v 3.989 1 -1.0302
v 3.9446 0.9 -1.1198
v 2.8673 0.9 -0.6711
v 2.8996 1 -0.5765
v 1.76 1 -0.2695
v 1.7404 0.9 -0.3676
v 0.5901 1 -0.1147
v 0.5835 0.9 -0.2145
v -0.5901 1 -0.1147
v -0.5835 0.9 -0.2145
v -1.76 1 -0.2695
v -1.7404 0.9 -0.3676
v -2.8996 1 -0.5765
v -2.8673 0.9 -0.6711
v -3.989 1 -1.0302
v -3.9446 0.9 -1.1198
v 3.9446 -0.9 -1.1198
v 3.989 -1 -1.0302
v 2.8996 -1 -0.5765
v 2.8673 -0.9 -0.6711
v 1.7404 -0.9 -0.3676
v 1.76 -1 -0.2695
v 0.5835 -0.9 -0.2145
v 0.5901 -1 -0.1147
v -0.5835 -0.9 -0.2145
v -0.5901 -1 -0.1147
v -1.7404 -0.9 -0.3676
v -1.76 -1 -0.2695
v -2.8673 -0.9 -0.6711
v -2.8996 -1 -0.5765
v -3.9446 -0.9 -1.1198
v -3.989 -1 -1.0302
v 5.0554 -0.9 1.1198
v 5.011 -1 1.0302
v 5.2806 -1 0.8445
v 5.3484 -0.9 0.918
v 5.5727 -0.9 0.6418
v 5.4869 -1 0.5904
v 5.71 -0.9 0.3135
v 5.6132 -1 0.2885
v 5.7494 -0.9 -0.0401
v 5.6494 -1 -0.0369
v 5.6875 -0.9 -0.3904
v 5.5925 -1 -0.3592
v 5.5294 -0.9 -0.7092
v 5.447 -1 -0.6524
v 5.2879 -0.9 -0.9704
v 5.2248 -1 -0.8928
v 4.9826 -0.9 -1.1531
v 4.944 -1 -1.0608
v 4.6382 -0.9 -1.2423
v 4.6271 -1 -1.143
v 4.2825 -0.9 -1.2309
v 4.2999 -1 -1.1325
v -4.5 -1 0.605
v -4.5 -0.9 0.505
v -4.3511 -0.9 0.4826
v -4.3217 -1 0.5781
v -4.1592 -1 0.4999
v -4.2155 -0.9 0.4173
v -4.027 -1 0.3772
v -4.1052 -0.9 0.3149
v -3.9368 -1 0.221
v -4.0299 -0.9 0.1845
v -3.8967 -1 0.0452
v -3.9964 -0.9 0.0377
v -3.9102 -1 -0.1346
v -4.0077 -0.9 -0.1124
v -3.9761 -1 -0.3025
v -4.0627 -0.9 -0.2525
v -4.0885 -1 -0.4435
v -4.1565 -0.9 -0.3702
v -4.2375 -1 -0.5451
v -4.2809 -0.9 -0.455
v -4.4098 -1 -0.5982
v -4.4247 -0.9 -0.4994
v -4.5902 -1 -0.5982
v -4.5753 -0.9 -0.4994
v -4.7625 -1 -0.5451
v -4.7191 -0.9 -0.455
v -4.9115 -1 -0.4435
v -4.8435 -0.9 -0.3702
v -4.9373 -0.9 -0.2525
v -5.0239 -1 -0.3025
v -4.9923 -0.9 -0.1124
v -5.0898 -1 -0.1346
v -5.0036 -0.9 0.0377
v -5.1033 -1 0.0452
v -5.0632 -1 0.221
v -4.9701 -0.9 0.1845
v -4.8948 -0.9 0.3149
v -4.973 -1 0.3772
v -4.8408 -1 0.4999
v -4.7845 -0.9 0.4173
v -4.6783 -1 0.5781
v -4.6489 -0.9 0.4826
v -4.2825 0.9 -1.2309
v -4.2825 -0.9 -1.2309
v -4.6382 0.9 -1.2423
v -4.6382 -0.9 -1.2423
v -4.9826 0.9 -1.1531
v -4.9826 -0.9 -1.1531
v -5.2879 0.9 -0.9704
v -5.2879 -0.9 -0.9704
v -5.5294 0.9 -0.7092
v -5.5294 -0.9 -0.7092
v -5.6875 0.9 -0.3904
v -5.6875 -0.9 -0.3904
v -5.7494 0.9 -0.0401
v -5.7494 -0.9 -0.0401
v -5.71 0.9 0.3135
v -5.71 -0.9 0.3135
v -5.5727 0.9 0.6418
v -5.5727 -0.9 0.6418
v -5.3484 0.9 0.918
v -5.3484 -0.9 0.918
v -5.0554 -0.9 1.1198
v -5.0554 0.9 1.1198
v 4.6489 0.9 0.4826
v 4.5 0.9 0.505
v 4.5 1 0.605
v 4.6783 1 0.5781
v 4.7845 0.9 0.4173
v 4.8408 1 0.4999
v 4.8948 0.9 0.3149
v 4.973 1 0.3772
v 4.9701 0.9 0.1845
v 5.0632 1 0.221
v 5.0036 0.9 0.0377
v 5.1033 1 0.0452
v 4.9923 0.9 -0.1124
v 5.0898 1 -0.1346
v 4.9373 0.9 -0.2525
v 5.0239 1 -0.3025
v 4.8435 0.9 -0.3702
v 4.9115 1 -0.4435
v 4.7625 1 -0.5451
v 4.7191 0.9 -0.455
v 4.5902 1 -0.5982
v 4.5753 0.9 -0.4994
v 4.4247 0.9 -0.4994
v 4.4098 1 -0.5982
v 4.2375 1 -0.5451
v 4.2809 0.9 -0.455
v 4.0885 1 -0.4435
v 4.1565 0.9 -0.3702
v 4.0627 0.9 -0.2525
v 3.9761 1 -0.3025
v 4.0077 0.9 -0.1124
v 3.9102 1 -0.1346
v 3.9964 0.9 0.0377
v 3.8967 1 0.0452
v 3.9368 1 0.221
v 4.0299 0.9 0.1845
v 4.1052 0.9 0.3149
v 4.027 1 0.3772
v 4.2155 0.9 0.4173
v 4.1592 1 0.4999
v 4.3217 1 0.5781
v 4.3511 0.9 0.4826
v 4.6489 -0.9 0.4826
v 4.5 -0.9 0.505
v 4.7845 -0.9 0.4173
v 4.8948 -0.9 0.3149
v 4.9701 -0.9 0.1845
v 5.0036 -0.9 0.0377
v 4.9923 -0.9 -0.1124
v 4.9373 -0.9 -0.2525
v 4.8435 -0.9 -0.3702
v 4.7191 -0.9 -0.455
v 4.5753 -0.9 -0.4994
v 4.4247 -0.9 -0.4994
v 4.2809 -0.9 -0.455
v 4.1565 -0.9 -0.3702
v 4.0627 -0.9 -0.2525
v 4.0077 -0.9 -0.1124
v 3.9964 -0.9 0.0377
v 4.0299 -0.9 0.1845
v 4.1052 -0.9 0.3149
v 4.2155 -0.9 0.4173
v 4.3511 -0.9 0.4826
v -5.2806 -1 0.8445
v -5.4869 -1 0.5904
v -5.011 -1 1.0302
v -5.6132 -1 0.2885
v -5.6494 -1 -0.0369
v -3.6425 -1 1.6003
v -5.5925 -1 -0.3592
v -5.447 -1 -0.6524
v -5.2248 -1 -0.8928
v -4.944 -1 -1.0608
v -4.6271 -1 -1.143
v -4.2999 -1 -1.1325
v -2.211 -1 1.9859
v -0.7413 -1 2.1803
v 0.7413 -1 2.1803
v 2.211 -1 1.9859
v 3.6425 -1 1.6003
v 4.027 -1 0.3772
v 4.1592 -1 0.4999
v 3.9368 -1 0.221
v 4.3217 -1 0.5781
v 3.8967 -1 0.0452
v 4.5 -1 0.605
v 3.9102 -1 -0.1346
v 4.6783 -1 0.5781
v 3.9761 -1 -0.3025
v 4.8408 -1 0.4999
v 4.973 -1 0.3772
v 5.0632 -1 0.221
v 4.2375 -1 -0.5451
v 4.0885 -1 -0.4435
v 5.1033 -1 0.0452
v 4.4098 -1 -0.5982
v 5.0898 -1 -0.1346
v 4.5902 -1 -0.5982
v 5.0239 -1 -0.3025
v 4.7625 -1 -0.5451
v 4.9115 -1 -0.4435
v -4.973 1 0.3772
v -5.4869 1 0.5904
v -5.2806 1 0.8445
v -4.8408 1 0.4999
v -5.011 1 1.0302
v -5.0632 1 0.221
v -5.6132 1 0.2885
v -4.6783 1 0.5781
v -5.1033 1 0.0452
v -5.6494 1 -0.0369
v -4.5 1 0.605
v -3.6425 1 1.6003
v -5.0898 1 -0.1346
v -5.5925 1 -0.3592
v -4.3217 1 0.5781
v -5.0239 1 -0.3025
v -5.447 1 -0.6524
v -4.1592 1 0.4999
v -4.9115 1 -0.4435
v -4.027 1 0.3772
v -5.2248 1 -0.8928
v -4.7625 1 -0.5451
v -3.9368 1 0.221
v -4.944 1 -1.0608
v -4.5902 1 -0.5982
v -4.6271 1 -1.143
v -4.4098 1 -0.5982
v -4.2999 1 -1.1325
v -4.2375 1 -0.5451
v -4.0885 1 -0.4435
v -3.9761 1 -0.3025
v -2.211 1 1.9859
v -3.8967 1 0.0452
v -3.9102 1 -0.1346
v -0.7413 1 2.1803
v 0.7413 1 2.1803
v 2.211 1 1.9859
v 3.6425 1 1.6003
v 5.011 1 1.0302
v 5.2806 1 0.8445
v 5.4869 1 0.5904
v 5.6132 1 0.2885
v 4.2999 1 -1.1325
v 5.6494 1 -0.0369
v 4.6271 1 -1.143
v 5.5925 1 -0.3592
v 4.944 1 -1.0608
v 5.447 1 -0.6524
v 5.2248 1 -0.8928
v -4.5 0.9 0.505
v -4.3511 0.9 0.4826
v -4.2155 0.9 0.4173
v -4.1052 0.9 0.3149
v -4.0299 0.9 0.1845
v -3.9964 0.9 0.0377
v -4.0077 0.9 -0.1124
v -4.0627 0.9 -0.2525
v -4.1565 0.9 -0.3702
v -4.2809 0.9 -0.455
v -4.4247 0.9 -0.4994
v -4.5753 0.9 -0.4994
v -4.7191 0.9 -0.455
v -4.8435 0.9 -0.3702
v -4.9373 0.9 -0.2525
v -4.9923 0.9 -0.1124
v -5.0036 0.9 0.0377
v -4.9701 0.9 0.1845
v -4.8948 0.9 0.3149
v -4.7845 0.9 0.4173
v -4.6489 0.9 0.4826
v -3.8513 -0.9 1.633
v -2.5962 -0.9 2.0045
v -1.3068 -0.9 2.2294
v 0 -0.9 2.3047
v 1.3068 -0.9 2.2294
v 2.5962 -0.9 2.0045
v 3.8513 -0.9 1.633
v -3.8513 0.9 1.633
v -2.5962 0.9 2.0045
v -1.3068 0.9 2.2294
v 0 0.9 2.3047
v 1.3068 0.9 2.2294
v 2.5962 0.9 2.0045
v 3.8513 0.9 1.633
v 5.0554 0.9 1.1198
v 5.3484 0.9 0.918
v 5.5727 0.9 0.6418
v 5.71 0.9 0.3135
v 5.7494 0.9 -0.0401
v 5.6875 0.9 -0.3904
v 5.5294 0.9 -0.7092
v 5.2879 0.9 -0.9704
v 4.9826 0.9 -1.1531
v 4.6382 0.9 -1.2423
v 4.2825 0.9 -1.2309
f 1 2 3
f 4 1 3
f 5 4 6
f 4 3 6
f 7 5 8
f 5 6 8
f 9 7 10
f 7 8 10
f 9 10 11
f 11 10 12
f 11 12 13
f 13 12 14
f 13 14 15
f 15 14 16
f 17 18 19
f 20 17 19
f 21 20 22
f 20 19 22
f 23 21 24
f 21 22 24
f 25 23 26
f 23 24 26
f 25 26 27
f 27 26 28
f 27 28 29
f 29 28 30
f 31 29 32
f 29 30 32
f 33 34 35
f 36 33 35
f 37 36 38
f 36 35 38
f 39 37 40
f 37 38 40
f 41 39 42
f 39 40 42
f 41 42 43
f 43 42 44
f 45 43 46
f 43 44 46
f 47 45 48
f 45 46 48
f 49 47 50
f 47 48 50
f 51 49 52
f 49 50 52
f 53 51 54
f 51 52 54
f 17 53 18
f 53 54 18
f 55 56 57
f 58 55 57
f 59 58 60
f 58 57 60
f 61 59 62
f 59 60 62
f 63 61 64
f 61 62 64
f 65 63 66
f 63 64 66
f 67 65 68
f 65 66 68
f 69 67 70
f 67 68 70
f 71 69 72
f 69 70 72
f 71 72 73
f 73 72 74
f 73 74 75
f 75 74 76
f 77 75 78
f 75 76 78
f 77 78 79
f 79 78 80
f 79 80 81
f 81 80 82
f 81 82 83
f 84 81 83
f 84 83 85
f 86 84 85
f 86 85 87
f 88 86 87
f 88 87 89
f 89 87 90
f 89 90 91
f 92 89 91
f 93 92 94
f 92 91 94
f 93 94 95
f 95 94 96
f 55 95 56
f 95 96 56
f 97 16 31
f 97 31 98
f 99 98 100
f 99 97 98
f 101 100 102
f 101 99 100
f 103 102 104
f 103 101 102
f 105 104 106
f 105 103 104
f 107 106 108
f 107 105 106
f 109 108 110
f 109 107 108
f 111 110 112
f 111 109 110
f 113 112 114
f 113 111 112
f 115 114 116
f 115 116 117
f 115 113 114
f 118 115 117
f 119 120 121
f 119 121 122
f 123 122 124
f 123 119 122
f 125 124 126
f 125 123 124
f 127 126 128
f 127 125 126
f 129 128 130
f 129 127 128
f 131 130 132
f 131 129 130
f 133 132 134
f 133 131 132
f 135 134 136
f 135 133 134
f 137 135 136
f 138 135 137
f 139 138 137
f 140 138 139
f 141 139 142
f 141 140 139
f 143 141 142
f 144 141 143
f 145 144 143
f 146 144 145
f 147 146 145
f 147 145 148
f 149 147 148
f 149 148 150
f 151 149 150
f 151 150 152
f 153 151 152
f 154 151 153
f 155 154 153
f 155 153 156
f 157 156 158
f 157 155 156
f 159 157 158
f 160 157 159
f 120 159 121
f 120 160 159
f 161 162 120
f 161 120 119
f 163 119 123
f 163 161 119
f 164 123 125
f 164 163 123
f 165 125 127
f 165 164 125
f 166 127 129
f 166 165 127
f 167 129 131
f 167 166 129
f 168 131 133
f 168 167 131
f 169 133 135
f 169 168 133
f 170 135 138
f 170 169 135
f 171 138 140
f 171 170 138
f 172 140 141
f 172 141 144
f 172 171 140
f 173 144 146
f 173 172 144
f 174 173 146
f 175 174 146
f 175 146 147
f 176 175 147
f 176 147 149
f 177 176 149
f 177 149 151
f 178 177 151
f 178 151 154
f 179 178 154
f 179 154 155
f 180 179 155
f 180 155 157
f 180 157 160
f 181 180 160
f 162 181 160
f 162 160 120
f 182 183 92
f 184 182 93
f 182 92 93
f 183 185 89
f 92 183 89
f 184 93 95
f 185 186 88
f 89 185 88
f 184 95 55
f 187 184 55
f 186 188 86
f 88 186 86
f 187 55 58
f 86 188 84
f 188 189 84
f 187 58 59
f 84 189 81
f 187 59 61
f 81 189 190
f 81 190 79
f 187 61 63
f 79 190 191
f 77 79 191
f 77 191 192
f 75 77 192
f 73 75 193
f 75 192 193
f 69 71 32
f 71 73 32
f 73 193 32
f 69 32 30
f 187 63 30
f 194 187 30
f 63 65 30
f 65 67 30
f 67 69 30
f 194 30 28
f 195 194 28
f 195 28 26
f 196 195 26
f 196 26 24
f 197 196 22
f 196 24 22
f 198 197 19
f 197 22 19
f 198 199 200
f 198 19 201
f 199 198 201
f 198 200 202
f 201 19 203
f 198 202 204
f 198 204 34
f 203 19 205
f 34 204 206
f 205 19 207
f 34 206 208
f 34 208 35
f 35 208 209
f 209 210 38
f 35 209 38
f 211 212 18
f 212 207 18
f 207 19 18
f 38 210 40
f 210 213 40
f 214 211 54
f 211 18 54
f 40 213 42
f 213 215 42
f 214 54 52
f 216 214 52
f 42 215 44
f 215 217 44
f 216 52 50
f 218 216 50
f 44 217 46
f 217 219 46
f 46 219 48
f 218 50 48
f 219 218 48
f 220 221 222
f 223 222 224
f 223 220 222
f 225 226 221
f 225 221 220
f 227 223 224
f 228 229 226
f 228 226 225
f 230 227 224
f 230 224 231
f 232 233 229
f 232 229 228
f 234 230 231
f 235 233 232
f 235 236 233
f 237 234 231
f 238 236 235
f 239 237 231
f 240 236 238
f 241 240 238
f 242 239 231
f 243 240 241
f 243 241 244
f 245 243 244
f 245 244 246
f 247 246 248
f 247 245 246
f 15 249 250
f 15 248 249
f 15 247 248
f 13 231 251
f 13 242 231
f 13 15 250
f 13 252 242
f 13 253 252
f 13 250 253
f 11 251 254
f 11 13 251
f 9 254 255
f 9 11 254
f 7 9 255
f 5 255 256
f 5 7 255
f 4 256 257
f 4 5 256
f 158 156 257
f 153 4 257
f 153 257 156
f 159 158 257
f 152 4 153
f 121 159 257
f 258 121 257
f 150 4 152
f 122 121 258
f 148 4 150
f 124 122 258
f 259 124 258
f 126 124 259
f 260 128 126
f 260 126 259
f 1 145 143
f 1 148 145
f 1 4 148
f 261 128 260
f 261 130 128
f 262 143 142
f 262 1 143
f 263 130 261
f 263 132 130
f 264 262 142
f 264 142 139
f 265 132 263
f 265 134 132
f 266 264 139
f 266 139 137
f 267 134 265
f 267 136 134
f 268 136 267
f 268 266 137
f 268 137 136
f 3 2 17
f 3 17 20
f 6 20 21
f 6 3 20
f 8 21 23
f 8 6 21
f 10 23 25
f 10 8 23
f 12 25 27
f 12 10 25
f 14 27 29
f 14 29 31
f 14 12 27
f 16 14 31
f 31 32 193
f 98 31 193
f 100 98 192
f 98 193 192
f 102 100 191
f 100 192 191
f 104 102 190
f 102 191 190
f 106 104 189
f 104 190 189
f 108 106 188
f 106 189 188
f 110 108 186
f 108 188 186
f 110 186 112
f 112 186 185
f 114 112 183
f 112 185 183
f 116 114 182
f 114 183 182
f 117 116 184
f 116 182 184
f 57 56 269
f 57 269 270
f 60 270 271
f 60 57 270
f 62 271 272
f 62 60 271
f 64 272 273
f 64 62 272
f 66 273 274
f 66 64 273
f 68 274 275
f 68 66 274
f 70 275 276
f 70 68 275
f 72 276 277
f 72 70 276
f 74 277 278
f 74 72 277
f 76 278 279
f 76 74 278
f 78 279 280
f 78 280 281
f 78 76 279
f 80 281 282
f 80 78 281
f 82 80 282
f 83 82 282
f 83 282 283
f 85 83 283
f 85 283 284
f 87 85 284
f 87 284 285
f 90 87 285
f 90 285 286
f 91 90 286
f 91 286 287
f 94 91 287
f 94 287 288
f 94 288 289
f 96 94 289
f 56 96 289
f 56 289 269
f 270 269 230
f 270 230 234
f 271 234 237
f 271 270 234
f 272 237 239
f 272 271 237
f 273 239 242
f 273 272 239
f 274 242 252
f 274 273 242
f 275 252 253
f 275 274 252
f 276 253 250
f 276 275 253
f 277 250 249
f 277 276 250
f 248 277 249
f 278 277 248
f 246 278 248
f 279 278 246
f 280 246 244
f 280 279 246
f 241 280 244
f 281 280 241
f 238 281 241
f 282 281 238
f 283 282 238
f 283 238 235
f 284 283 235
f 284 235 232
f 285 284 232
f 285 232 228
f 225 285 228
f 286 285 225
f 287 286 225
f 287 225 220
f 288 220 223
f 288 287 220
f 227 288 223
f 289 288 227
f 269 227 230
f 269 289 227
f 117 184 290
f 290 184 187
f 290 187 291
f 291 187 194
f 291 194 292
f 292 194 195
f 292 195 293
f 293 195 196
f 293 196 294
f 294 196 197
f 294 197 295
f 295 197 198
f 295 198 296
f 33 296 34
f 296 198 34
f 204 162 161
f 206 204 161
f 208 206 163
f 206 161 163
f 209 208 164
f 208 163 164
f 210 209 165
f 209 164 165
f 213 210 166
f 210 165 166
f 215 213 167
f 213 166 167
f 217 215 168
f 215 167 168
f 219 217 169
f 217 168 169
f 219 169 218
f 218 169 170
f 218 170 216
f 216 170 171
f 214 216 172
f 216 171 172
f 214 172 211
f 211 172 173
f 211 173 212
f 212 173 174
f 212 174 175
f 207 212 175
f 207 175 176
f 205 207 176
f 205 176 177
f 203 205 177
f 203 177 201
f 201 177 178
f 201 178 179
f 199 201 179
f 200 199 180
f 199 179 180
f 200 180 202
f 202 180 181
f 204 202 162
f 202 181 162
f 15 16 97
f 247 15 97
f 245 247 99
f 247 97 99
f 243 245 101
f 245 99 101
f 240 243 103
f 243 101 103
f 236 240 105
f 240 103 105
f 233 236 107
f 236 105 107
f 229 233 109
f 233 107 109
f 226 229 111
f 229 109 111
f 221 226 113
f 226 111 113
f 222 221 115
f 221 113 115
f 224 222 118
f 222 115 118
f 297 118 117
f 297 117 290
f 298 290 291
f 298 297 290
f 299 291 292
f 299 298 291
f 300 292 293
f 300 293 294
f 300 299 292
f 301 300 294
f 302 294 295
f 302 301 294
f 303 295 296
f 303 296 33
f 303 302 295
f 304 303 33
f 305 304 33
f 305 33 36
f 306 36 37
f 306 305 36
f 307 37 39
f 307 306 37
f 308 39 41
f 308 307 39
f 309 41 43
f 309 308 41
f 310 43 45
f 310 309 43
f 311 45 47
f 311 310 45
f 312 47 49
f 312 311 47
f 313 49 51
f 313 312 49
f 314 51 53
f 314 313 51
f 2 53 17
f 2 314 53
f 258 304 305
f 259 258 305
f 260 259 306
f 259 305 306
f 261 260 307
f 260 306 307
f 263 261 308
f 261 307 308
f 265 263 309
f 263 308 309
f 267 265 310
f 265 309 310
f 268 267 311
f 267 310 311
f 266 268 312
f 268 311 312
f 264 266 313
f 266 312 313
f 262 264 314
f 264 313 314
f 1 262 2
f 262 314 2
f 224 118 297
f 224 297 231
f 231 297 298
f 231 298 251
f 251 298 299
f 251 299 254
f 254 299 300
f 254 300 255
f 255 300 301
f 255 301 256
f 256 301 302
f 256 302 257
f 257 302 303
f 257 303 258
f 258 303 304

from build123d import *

# Parameters (mm, degrees)
SKETCH1_R           = 0.505
BOSS_EXTRUDE1_DEPTH = 1
CHAMFER1_SIZE       = 0.1
CHAMFER2_SIZE       = 0.1


with BuildPart() as part:
    # Sketch1 → Boss-Extrude1 (new, symmetric)
    with BuildSketch(Plane(origin=(0, 0, 0), x_dir=(1, 0, 0), z_dir=(0, 1, 0))):
        with BuildLine():
            ThreePointArc((-3.944558257, 1.11981448), (-5.61981448, 0.555441743), (-5.055441743, -1.11981448))
            ThreePointArc((-5.055441743, -1.11981448), (0, -2.304718782), (5.055441743, -1.11981448))
            ThreePointArc((5.055441743, -1.11981448), (5.61981448, 0.555441743), (3.944558257, 1.11981448))
            ThreePointArc((3.944558257, 1.11981448), (0, 0.195281218), (-3.944558257, 1.11981448))
        make_face()
        with Locations(Location((-4.5, 0, 0), (0, 0, 270))):
            Circle(SKETCH1_R, mode=Mode.SUBTRACT)
        with Locations(Location((4.5, 0, 0), (0, 0, 270))):
            Circle(SKETCH1_R, mode=Mode.SUBTRACT)
    extrude(amount=BOSS_EXTRUDE1_DEPTH, both=True)

    # Chamfer1
    chamfer1_edges = [part.edges().sort_by_distance(p)[0] for p in [
        (0, 1, 2.304718782),
        (5.61981448, 1, -0.555441743),
        (0, 1, -0.195281218),
        (5.61981448, -1, -0.555441743),
        (0, -1, 2.304718782),
        (-5.61981448, -1, -0.555441743),
        (0, -1, -0.195281218),
        (-5.61981448, 1, -0.555441743),
    ]]
    chamfer(chamfer1_edges, length=CHAMFER1_SIZE)

    # Chamfer2
    chamfer2_edges = [part.edges().sort_by_distance(p)[0] for p in [
        (-4.5, -1, -0.505),
        (-4.5, 1, -0.505),
        (4.5, -1, -0.505),
        (4.5, 1, -0.505),
    ]]
    chamfer(chamfer2_edges, length=CHAMFER2_SIZE)


solid = part.part
